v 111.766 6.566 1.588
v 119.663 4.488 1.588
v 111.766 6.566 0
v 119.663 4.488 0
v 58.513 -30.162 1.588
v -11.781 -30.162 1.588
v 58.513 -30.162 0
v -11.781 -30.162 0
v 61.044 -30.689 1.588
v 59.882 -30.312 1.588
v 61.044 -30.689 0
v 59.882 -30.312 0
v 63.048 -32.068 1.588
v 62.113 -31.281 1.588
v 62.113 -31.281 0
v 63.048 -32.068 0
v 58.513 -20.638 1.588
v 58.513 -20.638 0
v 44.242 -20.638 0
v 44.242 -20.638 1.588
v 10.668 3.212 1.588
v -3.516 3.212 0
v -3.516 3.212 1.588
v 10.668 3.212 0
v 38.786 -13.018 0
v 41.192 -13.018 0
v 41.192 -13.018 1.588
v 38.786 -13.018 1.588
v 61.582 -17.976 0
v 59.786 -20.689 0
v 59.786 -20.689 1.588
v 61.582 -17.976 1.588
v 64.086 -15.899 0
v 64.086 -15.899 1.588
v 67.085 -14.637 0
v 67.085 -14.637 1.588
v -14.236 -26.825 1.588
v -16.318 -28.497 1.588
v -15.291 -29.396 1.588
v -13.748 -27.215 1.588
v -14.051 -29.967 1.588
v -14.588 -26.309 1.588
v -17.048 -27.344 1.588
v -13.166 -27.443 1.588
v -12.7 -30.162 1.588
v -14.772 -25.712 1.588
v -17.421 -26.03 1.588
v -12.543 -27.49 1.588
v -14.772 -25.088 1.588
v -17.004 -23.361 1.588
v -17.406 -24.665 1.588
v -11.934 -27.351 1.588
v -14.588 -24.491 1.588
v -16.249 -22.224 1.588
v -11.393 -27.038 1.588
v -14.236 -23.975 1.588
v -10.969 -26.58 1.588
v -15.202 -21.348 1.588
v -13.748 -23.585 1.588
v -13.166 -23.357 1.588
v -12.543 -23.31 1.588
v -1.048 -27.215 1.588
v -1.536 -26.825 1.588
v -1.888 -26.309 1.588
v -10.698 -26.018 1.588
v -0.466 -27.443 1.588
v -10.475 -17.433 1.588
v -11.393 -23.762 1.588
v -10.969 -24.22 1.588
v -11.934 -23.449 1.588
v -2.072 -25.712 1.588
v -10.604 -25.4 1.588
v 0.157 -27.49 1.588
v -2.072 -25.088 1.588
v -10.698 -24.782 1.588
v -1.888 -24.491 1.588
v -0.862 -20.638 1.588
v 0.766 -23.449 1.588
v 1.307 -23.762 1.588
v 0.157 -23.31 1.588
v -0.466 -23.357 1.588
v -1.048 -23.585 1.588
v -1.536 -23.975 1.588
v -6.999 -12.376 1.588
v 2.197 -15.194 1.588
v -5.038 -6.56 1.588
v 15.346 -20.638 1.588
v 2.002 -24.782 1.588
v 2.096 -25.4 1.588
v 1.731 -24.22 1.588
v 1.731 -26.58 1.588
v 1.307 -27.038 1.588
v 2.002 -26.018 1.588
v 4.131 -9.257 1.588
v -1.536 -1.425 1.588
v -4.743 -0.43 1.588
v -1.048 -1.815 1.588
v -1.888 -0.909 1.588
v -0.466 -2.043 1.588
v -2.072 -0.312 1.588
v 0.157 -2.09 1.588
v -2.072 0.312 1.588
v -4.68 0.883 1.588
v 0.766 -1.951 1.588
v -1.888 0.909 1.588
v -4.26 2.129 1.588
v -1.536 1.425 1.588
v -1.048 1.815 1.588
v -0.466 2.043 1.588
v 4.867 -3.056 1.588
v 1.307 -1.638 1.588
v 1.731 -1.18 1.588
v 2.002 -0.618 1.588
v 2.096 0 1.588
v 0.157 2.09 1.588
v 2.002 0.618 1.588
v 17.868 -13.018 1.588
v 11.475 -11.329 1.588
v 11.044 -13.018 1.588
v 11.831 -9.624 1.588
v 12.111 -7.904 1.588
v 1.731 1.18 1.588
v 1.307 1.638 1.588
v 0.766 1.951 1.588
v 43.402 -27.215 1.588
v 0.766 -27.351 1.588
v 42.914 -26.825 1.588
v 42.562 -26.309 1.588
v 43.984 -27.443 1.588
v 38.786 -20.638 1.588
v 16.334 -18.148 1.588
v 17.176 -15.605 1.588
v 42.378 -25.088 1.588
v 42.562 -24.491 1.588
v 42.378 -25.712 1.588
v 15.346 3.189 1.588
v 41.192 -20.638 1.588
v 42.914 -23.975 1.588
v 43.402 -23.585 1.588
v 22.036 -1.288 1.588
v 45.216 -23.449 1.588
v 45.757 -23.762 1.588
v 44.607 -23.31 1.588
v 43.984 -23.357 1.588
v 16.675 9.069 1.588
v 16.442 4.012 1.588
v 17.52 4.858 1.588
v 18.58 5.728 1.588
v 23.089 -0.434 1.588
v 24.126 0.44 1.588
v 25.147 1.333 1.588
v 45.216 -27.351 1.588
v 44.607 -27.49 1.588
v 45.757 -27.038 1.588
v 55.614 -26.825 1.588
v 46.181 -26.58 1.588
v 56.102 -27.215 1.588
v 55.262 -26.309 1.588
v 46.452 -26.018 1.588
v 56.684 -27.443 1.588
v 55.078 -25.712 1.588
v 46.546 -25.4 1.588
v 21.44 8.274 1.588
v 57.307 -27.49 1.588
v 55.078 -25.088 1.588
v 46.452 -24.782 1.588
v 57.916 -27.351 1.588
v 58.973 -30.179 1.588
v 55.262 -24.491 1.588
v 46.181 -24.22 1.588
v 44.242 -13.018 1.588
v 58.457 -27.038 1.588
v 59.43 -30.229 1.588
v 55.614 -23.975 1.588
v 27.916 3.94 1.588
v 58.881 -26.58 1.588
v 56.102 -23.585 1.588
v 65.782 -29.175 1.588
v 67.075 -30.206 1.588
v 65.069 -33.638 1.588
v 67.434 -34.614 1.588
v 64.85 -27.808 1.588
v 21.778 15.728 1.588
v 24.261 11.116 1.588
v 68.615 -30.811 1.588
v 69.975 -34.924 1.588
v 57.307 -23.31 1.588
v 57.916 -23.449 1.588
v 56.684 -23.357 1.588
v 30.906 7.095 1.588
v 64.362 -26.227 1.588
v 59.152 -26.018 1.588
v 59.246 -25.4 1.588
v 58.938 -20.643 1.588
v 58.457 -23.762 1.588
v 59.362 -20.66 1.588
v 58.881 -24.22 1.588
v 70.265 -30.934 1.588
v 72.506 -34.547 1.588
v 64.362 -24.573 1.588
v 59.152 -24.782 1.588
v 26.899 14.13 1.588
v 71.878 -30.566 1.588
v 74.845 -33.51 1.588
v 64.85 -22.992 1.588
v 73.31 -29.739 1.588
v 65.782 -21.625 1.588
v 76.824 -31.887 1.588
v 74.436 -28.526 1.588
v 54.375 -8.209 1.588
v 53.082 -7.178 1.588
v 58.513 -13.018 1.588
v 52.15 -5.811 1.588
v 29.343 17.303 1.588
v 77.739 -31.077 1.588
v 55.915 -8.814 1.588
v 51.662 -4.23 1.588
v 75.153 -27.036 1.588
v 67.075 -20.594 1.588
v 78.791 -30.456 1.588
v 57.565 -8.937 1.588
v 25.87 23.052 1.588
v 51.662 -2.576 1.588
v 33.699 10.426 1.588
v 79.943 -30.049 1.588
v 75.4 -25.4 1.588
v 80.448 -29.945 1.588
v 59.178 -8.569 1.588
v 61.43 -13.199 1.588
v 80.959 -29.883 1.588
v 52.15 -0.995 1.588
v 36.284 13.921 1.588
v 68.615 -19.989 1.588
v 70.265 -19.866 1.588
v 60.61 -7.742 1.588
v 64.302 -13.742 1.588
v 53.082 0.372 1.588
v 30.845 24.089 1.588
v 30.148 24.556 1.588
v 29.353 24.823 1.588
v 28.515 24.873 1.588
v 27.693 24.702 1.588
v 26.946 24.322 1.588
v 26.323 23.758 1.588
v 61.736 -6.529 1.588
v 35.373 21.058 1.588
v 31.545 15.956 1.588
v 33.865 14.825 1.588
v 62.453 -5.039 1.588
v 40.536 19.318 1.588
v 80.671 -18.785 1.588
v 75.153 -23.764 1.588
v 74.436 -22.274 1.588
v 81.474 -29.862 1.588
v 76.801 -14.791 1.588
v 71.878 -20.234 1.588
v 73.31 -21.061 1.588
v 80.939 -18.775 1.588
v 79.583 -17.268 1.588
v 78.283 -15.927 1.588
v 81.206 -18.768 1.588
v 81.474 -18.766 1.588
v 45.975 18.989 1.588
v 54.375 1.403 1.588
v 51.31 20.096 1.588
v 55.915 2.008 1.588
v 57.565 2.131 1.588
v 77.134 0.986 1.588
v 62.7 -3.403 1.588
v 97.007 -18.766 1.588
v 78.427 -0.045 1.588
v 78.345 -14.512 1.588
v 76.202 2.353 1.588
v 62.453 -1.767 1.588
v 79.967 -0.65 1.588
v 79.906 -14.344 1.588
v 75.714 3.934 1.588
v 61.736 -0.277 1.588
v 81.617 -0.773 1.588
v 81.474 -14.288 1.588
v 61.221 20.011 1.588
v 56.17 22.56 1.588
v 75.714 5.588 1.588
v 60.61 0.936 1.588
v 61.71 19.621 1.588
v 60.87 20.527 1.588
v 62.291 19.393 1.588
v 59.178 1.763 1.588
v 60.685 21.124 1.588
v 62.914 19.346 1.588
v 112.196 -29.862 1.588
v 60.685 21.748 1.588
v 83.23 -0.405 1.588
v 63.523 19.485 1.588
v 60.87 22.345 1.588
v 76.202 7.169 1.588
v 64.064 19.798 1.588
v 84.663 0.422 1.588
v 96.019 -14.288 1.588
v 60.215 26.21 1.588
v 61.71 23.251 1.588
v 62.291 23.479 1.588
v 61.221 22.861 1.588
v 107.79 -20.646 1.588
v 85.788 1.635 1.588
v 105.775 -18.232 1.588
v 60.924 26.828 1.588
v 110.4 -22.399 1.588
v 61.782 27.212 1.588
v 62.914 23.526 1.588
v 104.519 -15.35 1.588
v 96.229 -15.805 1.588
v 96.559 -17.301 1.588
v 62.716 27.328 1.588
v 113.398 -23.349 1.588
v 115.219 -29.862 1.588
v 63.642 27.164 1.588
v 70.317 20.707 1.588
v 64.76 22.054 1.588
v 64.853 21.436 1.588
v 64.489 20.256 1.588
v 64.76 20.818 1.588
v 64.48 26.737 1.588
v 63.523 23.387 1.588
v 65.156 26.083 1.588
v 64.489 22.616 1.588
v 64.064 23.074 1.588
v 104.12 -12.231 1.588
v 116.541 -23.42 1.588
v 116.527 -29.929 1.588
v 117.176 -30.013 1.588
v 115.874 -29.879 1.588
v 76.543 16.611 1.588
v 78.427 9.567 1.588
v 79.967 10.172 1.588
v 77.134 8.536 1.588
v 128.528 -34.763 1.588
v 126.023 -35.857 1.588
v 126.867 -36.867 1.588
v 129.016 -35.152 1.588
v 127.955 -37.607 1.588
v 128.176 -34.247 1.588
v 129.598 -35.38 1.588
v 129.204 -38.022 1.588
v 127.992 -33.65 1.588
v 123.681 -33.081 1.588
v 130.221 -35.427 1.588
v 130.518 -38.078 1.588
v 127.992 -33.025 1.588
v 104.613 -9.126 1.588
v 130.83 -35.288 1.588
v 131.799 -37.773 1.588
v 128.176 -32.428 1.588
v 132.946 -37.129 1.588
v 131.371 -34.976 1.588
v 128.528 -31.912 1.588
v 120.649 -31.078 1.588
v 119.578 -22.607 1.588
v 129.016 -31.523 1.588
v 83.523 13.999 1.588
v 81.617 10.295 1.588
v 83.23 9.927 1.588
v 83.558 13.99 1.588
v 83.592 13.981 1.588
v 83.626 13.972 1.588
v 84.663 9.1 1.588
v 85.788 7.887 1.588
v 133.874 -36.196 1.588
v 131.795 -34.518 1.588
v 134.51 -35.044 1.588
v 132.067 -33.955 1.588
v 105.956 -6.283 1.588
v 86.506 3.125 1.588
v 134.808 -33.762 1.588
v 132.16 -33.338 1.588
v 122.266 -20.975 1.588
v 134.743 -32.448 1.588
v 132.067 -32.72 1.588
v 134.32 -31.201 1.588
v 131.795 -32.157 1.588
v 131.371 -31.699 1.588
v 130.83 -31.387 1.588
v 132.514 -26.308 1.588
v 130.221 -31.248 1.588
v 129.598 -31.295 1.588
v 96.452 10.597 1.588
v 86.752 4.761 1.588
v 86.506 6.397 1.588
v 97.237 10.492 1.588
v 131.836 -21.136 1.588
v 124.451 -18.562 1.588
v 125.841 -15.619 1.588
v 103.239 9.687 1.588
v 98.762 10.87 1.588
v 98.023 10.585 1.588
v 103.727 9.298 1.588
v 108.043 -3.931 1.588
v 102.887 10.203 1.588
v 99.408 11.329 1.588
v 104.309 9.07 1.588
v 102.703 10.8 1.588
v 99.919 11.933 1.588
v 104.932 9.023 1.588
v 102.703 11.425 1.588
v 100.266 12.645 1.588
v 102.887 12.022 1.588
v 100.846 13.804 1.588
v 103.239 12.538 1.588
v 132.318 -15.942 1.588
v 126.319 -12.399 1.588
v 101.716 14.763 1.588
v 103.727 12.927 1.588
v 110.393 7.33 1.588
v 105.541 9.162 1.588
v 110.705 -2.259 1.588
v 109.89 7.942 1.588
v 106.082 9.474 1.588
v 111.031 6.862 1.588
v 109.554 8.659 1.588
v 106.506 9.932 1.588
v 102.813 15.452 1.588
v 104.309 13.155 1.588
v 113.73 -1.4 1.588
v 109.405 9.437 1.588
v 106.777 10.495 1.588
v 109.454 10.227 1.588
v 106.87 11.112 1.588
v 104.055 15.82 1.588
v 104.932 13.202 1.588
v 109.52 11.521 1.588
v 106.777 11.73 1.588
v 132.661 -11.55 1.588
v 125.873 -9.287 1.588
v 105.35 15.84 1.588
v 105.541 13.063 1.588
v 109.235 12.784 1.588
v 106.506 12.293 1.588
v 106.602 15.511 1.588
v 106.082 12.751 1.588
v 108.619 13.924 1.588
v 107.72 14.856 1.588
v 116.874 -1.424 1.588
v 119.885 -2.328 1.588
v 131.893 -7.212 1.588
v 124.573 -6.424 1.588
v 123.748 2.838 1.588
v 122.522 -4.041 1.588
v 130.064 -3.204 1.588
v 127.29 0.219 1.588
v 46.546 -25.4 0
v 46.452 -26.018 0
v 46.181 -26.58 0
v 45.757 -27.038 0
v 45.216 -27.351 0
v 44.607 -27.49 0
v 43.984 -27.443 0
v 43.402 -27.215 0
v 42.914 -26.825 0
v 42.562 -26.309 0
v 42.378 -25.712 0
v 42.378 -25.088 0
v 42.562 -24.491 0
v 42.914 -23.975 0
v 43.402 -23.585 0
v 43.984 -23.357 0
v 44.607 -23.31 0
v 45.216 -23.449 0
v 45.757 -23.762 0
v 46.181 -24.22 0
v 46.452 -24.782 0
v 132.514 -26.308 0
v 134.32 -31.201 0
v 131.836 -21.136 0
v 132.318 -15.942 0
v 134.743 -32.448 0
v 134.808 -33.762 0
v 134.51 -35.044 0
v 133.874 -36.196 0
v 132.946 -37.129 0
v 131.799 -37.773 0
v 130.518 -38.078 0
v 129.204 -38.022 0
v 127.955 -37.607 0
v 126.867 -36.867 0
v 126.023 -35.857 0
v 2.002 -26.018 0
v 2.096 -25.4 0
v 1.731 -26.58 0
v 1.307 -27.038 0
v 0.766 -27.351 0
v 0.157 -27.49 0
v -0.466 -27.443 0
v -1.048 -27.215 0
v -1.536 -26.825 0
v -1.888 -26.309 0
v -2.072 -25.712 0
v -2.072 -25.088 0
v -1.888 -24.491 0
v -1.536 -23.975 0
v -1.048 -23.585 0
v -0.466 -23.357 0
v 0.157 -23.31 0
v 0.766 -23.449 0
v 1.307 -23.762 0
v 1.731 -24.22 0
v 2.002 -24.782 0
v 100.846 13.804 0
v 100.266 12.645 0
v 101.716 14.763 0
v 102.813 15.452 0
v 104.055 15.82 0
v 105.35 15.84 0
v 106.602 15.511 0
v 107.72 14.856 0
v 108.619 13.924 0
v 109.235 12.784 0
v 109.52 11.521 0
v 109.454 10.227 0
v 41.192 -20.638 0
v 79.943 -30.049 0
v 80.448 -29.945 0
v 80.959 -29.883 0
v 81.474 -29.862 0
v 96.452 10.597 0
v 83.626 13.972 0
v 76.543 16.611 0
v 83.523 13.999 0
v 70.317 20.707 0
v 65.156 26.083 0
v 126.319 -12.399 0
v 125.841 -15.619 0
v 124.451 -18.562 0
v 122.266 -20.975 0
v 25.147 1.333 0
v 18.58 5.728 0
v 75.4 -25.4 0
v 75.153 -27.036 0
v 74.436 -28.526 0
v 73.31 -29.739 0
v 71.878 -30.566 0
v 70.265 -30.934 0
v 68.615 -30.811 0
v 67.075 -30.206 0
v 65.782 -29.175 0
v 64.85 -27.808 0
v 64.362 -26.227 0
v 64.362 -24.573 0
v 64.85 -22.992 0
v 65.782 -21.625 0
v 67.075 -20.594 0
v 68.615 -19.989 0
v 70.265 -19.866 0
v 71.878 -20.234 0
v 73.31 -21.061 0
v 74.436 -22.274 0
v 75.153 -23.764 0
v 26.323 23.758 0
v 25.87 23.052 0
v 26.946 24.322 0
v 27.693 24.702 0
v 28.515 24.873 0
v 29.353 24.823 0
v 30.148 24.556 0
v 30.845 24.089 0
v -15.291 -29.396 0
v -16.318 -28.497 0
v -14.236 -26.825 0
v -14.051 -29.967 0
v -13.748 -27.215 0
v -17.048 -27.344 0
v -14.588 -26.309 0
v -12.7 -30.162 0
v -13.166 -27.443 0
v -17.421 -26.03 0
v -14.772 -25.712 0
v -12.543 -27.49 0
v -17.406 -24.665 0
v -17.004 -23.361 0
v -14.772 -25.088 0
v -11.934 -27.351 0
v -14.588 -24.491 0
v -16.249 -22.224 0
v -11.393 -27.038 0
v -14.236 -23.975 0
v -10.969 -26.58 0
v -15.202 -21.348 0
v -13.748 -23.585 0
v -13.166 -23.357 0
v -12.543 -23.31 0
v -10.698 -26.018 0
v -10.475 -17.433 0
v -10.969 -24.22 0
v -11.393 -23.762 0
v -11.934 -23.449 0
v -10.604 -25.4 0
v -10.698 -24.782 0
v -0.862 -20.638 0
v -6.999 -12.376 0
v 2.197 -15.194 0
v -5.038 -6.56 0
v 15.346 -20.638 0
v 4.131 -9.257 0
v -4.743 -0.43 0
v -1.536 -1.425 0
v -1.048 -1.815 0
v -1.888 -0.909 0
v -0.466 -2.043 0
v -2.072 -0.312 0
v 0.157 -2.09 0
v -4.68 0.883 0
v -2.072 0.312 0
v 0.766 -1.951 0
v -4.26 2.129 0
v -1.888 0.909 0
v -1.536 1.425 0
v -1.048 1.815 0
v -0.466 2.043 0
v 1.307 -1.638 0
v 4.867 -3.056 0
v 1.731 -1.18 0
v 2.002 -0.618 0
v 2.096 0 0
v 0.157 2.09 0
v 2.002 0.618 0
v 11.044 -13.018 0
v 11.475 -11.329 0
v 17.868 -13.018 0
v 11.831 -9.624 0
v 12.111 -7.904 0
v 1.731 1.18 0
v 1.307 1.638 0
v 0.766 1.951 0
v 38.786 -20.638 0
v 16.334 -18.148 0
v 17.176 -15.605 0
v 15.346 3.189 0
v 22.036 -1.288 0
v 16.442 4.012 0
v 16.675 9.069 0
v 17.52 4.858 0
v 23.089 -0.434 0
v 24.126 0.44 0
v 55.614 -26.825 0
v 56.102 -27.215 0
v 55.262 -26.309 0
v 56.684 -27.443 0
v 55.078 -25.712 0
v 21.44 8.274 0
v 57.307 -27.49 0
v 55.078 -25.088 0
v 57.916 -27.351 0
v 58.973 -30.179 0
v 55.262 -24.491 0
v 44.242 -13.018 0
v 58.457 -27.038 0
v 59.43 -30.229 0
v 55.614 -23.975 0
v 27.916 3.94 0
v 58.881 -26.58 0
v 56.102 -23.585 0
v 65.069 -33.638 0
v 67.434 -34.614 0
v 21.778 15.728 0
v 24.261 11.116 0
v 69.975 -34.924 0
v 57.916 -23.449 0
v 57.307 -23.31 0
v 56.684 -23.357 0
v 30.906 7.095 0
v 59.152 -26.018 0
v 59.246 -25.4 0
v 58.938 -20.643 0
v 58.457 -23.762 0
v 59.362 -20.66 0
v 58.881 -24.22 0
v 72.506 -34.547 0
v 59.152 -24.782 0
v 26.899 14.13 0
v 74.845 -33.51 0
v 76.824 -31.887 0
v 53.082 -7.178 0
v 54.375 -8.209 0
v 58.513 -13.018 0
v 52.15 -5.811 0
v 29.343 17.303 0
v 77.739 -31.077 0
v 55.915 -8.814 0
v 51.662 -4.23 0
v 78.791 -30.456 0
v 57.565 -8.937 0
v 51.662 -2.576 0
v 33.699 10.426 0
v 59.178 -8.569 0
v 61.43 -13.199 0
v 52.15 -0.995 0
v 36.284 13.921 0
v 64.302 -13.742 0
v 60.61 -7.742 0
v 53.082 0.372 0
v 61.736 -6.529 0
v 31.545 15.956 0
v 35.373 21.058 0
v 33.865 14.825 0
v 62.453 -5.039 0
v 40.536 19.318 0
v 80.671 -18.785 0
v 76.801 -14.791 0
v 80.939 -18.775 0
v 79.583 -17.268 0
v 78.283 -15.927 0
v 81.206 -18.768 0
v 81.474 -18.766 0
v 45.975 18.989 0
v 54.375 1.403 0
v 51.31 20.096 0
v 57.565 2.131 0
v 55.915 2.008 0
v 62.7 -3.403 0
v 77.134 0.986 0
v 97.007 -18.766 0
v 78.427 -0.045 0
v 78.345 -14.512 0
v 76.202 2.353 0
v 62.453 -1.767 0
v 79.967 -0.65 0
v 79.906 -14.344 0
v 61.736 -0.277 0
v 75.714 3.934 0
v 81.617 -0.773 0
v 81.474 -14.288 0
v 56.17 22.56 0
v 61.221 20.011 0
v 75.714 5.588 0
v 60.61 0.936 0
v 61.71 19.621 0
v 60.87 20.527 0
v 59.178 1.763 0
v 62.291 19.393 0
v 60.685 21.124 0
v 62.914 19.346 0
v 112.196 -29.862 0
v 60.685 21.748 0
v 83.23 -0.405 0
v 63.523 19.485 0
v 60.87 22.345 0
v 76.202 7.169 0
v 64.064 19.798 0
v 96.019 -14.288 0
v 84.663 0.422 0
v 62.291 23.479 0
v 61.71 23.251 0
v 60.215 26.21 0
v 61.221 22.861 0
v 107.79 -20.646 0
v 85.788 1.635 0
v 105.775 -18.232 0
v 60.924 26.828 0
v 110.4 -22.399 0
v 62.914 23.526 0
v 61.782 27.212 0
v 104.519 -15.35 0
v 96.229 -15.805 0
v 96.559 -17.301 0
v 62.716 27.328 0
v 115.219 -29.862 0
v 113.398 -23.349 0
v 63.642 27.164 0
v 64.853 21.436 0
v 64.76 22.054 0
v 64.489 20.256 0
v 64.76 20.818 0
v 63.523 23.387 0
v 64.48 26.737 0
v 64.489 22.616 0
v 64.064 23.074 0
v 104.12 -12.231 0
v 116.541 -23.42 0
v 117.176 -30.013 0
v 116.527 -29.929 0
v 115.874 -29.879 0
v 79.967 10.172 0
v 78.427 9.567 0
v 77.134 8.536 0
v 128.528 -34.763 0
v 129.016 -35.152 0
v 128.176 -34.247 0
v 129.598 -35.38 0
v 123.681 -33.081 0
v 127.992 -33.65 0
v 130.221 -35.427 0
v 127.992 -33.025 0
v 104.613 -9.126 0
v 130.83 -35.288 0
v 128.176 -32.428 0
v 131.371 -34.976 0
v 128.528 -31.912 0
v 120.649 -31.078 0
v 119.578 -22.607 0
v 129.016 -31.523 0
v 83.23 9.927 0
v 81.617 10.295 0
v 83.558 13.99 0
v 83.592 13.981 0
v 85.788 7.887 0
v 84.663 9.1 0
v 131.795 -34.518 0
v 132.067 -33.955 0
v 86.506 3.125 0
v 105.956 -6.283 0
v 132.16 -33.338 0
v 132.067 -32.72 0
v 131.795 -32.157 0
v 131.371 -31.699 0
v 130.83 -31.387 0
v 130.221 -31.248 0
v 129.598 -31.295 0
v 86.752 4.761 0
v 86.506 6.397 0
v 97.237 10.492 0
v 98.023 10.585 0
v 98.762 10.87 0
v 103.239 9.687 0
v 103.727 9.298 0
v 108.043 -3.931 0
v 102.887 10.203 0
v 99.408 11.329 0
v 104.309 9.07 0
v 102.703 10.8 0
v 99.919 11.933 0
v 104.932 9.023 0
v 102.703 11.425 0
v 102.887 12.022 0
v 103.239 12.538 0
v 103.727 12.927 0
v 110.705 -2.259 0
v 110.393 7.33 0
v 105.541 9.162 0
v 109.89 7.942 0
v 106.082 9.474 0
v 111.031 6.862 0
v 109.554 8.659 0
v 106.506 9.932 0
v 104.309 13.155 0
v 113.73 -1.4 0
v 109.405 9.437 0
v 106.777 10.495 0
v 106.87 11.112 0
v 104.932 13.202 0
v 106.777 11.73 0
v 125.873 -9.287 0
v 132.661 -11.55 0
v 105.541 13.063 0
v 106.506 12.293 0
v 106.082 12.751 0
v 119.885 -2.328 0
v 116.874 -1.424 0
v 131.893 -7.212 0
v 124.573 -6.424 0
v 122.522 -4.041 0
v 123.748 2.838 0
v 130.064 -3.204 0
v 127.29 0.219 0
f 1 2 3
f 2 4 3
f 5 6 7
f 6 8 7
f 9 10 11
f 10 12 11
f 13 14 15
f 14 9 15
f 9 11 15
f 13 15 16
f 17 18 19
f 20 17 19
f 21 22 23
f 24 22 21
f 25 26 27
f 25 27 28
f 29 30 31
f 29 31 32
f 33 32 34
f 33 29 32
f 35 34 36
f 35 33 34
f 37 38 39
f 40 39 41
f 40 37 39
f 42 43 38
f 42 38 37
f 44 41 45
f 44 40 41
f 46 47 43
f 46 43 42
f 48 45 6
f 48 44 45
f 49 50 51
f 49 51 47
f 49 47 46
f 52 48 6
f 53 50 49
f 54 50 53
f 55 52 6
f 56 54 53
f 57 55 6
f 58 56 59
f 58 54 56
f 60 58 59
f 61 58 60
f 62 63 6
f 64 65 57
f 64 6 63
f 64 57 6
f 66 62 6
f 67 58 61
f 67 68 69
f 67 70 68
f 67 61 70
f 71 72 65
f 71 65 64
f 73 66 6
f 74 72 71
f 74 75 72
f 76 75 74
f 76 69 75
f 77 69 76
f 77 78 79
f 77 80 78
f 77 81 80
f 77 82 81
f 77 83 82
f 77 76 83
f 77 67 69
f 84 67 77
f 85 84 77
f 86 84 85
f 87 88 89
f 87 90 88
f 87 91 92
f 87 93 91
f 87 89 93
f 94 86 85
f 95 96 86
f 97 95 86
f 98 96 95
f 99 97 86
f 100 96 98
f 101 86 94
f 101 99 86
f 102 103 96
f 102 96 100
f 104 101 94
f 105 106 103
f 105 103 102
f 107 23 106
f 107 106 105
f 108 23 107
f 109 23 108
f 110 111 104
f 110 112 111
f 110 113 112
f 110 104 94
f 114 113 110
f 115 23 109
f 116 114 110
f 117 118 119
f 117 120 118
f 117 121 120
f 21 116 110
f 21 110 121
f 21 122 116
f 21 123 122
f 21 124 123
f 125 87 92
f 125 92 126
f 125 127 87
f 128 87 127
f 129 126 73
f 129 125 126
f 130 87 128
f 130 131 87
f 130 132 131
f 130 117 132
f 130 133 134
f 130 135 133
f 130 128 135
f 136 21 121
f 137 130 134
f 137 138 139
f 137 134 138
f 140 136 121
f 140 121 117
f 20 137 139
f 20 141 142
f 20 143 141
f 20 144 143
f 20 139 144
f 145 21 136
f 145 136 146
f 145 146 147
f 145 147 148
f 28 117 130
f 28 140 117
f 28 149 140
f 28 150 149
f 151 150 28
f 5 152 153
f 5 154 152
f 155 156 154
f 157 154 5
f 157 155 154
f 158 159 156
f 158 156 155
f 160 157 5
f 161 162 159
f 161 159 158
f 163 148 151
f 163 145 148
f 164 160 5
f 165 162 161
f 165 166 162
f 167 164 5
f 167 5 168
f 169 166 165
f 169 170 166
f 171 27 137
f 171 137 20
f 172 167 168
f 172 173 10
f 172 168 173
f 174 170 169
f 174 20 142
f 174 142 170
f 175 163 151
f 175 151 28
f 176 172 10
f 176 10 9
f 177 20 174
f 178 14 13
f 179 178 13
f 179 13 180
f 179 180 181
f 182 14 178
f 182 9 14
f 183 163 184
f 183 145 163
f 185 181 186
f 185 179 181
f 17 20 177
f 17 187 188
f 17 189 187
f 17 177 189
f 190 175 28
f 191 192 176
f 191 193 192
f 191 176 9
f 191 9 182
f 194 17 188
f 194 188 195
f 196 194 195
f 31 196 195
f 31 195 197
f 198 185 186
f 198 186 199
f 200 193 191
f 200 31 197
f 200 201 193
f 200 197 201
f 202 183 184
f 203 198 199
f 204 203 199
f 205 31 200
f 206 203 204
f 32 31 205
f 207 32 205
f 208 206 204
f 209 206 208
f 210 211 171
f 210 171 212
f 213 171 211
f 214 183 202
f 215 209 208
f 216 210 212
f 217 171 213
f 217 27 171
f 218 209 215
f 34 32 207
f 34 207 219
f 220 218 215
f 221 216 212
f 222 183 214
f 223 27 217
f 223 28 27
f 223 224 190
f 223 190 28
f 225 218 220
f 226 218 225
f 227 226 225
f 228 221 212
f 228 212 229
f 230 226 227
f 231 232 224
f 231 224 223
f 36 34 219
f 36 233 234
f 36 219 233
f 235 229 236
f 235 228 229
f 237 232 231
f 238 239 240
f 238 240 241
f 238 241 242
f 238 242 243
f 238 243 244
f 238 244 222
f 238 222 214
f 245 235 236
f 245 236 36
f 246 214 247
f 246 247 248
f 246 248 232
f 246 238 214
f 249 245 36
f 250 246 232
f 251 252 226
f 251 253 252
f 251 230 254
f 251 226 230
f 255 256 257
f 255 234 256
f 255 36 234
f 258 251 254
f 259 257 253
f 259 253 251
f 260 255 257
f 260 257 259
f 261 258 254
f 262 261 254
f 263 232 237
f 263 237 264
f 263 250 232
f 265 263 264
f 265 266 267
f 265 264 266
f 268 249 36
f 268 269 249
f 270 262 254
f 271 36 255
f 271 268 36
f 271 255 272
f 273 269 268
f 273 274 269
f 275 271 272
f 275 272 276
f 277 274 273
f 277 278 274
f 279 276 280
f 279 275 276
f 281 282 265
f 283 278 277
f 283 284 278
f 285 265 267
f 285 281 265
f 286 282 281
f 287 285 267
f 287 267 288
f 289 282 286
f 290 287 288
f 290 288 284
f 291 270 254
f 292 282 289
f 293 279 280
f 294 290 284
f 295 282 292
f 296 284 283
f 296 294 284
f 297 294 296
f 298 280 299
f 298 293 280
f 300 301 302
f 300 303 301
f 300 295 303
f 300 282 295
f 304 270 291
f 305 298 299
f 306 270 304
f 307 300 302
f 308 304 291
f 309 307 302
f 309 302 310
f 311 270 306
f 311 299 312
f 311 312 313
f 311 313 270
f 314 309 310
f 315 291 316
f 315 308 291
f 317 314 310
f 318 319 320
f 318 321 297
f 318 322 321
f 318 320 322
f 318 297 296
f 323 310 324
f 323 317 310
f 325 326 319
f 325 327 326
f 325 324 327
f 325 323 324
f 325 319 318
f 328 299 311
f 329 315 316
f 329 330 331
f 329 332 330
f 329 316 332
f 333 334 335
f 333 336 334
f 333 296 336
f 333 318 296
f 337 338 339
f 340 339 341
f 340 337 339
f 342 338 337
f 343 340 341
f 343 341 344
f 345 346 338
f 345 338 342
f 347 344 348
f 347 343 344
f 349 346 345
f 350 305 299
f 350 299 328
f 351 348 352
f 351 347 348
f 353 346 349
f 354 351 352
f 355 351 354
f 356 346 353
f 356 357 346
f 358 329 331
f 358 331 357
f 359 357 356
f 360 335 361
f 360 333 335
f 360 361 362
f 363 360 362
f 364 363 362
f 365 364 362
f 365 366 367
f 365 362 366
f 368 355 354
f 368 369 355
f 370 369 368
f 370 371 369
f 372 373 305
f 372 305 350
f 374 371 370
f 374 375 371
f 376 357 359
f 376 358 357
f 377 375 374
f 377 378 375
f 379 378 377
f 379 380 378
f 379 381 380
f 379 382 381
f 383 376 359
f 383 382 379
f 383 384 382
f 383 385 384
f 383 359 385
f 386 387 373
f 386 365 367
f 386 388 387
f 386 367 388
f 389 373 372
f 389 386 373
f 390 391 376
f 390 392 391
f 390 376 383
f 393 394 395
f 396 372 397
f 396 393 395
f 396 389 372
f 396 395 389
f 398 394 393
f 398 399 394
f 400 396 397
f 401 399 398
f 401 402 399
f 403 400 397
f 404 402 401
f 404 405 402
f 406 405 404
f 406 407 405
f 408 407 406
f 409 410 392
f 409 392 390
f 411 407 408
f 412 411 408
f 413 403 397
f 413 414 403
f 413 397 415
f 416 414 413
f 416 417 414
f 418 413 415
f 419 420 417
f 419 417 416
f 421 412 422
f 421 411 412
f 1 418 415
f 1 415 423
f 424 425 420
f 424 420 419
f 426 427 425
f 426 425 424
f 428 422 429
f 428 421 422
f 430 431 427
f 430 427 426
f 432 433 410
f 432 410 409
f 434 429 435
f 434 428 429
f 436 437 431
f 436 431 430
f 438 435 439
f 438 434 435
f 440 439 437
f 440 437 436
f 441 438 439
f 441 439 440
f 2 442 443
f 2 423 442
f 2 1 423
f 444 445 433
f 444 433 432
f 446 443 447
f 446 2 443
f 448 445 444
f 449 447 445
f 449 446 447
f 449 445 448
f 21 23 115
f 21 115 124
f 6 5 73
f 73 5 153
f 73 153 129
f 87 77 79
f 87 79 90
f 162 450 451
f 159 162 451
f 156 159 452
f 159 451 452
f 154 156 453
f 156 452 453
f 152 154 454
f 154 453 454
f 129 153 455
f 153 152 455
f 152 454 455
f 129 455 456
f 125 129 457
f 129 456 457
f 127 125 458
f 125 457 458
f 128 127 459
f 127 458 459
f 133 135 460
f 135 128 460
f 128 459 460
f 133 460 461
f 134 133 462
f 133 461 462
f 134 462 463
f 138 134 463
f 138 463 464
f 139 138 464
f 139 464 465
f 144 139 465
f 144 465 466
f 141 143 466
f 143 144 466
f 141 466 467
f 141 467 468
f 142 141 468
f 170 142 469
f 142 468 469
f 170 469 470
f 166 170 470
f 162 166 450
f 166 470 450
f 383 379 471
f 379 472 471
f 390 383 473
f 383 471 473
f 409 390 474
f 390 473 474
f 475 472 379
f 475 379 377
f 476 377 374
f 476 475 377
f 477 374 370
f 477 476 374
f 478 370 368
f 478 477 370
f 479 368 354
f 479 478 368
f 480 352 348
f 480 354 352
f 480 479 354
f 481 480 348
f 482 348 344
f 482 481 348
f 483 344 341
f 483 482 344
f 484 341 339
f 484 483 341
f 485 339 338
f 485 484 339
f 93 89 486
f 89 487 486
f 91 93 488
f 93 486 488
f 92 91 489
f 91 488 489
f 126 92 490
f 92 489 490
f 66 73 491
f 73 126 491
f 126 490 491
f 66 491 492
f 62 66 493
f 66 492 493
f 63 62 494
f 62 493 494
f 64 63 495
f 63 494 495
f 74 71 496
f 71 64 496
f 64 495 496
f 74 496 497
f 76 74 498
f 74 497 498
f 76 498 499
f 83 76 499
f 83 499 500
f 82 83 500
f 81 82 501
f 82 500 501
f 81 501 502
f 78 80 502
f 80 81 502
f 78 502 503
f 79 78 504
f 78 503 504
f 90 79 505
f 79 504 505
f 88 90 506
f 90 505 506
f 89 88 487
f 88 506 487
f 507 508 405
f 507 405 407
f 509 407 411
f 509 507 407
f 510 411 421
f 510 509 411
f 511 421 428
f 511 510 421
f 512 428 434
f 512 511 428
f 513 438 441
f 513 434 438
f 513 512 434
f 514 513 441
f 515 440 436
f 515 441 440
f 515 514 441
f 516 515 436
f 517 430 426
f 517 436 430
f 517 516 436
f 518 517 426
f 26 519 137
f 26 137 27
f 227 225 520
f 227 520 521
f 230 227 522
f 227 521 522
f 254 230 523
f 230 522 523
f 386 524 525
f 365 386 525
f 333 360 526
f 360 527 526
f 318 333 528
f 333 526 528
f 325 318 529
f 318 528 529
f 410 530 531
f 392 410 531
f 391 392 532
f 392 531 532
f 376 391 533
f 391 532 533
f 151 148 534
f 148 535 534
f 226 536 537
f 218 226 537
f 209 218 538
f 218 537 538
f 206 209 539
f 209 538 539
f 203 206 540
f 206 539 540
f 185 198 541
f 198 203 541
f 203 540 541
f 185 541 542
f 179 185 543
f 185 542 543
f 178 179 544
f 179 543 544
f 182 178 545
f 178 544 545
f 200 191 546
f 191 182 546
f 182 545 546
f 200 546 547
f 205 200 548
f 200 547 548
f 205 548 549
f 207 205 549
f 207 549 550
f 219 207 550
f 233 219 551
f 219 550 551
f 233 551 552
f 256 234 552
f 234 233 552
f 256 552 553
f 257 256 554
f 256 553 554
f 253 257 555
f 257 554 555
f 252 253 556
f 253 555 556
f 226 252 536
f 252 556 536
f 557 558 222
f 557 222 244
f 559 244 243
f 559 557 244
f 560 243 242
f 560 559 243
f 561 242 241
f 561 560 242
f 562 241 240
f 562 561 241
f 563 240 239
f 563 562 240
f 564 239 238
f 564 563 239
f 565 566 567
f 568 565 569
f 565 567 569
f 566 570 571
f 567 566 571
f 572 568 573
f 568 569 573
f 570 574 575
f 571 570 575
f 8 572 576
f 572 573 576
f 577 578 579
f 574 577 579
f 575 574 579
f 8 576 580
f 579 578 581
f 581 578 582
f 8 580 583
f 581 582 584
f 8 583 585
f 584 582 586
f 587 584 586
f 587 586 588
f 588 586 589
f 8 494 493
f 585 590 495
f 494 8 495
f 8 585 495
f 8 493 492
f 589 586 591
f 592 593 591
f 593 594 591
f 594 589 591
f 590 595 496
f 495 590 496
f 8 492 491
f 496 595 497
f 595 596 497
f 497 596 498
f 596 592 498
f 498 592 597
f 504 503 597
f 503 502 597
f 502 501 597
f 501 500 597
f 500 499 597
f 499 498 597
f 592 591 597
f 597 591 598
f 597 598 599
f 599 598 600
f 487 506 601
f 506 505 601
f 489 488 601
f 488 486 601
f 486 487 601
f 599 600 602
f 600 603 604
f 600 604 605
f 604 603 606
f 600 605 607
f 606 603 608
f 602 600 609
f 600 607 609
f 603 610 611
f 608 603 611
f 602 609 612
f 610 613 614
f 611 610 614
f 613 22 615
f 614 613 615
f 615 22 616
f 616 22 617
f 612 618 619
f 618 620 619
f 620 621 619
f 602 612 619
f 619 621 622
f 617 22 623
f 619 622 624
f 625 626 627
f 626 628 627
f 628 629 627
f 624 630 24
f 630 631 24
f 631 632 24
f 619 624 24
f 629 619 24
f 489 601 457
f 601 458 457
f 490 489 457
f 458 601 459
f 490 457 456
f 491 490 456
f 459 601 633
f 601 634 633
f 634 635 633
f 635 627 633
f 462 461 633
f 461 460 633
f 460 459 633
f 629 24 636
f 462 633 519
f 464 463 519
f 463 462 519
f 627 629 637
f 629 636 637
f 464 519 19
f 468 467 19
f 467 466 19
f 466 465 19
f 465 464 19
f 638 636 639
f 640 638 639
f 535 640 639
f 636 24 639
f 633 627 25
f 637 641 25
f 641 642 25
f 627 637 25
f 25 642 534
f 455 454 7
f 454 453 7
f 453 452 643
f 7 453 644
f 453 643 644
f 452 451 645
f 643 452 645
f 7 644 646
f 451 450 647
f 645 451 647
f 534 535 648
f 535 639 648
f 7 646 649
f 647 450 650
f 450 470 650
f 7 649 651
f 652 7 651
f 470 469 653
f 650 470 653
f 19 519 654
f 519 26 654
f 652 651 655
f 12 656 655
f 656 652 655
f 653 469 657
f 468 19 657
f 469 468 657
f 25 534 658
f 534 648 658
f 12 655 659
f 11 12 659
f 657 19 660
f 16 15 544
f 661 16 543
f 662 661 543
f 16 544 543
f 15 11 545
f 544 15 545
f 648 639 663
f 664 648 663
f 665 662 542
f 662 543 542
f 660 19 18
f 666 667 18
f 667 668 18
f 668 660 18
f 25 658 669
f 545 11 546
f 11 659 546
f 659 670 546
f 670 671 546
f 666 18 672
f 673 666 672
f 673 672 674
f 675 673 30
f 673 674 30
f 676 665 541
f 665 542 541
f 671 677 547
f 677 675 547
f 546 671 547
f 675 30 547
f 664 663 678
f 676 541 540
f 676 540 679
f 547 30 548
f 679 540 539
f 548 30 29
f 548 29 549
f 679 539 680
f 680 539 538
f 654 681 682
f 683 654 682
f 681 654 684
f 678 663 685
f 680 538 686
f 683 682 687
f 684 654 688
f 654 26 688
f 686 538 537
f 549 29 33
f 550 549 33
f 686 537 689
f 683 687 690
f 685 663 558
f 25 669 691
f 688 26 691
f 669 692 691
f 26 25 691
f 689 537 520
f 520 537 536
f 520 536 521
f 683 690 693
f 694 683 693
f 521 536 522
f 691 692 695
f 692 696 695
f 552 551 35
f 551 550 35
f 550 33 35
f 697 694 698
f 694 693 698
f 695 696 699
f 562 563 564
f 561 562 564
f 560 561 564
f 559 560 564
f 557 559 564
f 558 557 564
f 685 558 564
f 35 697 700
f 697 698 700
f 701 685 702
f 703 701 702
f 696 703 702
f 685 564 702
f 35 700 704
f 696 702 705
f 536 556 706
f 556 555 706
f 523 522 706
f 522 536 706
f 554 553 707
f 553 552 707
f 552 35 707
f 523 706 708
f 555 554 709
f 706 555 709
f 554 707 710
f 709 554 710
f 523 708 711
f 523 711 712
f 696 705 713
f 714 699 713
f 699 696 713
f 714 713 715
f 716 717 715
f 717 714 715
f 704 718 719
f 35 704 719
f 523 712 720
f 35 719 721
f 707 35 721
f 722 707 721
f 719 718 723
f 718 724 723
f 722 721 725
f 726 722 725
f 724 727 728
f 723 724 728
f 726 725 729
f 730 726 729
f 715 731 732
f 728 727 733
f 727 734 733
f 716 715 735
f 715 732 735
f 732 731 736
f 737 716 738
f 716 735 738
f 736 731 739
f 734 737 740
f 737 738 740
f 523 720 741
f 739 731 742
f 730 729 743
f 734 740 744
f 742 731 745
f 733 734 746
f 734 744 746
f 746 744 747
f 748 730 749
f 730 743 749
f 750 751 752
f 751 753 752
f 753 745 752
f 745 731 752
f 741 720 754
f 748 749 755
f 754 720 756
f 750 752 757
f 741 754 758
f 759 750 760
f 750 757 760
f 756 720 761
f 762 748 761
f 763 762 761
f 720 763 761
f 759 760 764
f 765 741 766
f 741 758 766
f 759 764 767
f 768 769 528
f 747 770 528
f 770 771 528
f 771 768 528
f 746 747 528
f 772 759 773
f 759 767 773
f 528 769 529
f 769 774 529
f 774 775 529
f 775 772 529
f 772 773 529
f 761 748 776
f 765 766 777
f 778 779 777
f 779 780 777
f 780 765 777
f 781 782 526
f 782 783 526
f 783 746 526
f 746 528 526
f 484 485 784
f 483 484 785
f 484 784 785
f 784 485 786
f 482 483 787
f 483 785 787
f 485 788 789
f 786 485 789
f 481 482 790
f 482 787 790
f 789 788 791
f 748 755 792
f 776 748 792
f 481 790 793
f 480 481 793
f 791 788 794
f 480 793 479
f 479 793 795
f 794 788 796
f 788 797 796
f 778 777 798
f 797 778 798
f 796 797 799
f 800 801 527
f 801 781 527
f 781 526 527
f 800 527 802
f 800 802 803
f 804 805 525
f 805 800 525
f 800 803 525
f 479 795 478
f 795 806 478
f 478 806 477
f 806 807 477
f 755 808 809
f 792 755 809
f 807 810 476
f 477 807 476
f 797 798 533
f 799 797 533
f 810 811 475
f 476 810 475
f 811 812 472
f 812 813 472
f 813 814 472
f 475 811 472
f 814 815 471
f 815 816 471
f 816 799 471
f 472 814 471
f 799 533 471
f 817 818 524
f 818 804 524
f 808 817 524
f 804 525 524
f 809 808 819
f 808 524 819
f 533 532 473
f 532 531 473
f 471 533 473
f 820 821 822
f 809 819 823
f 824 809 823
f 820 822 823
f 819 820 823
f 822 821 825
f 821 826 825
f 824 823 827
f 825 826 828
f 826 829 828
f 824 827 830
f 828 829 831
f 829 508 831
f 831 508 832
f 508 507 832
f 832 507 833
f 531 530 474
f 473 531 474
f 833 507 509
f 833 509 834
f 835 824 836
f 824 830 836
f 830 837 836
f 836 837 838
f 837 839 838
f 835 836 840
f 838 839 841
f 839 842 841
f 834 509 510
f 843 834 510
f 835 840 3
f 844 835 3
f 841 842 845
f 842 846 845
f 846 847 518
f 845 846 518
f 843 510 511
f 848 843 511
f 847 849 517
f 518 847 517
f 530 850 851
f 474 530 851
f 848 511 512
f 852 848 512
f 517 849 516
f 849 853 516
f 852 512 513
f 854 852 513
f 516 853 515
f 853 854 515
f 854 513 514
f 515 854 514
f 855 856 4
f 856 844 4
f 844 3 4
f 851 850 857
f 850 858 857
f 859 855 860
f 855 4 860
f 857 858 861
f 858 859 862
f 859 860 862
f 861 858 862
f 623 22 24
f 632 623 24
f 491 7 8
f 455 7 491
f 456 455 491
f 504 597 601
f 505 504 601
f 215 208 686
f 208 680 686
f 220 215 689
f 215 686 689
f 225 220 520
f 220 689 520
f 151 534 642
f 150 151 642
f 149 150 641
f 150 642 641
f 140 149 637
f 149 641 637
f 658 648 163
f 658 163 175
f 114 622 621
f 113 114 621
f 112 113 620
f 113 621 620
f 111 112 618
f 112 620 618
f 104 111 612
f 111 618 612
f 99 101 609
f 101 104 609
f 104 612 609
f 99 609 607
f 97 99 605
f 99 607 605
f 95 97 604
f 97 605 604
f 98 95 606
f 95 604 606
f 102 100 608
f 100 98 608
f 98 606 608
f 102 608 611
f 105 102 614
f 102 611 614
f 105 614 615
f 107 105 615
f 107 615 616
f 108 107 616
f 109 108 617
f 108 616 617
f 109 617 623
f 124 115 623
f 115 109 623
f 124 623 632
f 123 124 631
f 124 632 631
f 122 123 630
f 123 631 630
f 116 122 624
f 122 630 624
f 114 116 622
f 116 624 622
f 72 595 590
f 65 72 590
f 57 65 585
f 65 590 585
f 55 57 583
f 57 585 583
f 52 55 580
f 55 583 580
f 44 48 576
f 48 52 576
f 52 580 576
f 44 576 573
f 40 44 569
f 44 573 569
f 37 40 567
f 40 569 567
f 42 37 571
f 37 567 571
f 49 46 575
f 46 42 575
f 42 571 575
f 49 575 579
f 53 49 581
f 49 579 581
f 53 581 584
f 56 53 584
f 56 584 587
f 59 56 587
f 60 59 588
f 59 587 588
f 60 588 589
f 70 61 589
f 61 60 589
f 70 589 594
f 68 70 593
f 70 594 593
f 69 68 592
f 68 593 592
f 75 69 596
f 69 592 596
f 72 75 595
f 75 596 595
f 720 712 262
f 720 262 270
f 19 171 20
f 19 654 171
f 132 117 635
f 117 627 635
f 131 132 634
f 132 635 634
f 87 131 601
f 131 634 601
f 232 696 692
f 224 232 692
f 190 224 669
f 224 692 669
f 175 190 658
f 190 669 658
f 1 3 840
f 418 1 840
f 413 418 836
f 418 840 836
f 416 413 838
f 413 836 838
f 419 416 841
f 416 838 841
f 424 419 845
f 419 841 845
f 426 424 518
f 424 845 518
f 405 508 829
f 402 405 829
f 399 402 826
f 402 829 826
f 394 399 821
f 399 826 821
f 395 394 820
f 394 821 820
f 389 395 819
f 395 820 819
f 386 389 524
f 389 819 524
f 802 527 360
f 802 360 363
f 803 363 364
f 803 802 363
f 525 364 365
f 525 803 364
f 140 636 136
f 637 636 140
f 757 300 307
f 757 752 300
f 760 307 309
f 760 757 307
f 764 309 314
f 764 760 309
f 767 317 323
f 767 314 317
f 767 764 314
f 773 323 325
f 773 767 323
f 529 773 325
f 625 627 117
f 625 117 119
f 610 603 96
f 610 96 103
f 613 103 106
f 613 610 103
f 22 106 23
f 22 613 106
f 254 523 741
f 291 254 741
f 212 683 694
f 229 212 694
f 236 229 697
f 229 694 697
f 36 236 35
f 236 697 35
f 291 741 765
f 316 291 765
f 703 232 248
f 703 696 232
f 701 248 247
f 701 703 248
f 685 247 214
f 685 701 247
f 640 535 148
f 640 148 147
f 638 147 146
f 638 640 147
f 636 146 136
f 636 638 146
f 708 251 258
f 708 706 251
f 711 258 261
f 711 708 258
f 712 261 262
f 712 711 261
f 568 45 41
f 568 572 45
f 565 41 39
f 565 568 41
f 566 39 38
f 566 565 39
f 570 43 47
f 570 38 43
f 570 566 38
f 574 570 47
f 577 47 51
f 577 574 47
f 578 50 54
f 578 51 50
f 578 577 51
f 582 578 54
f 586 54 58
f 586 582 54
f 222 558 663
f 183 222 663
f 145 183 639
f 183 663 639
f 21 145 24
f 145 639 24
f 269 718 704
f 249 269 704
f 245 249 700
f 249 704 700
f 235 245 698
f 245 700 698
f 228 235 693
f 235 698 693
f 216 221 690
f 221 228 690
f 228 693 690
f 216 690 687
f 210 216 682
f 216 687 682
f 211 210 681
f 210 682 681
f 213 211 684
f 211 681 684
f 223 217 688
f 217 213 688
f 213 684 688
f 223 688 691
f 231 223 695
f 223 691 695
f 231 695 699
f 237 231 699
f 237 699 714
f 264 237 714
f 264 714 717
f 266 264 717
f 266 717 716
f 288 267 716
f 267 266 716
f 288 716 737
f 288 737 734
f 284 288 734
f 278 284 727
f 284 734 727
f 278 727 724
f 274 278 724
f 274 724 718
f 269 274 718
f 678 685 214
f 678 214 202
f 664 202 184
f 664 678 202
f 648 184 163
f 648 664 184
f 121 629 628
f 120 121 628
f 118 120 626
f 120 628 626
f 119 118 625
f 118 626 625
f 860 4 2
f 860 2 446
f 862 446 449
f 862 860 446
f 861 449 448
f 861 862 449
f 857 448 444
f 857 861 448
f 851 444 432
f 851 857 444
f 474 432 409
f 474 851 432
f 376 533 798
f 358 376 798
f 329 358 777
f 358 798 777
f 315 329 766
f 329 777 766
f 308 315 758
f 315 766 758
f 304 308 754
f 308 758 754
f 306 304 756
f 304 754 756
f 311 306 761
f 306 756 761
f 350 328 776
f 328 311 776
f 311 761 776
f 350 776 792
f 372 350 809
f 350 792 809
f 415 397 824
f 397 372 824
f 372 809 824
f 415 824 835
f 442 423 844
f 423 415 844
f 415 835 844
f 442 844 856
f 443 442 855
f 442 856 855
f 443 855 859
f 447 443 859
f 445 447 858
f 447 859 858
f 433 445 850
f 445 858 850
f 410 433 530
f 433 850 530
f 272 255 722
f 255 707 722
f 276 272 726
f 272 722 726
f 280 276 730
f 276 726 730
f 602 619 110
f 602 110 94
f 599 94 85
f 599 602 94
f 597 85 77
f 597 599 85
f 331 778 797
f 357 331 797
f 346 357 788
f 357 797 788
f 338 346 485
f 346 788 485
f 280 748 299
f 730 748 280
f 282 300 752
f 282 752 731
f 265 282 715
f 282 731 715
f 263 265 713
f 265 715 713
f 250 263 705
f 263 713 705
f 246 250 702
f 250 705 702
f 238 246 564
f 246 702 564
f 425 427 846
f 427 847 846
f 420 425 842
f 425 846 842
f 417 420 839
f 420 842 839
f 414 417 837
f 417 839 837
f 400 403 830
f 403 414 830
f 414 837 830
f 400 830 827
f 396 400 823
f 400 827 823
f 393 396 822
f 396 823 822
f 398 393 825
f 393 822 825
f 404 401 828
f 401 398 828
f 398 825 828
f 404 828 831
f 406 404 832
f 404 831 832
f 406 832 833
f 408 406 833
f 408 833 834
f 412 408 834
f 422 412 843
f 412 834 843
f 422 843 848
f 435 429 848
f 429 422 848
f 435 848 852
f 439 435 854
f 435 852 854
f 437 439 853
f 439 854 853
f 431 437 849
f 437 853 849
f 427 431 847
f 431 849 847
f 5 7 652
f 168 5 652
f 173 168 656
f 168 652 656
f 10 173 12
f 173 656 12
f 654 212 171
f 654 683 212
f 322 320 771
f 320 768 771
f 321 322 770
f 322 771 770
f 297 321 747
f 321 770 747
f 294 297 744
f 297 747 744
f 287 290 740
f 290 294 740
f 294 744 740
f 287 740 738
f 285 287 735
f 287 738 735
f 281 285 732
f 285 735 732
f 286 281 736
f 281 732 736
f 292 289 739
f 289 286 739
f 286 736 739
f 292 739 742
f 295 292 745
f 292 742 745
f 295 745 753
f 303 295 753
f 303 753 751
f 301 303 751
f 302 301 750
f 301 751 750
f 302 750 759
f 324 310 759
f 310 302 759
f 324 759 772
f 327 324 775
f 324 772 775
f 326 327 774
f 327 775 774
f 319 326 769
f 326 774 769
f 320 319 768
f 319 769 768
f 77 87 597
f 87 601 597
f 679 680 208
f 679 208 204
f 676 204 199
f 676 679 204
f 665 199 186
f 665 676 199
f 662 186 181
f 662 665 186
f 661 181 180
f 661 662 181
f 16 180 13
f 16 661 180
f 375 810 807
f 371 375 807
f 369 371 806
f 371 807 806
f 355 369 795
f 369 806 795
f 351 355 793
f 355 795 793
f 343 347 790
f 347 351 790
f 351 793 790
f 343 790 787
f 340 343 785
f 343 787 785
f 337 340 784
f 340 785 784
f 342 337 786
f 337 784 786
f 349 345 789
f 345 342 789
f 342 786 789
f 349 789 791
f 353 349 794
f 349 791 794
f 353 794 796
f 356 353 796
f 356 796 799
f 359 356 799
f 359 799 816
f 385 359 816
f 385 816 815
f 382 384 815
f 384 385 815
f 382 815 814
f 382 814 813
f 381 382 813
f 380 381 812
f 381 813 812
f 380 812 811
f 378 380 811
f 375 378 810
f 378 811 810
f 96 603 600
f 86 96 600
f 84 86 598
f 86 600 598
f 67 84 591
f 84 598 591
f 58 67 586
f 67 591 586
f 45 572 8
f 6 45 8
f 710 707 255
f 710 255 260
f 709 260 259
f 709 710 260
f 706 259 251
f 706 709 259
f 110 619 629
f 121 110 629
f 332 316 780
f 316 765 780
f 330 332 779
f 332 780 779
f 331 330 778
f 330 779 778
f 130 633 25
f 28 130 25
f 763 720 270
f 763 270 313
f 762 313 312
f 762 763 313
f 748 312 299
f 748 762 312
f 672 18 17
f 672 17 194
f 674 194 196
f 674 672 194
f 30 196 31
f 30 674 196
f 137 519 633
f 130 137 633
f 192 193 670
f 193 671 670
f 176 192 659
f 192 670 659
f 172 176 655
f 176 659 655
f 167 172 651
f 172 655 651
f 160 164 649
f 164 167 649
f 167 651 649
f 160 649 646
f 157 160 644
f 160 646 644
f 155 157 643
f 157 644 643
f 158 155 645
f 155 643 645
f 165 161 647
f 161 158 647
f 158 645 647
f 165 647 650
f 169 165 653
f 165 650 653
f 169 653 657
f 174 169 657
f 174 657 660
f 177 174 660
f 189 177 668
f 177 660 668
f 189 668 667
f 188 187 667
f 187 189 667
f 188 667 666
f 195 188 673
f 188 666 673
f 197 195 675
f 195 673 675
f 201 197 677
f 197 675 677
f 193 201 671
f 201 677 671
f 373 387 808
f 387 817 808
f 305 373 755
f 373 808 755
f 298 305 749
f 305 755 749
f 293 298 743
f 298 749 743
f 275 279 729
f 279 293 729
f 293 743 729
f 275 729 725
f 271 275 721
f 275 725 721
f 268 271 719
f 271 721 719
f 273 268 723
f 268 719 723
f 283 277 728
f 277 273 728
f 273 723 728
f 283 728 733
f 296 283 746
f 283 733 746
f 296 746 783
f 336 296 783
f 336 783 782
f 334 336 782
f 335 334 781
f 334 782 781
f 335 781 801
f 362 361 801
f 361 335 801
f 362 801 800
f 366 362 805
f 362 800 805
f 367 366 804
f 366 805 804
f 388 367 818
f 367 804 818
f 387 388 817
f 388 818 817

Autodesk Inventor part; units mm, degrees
ref_plane "YZ Plane" through (0, 0, 0) normal (1, 0, 0) x (0, 1, 0)
ref_plane "XZ Plane" through (0, 0, 0) normal (0, 1, 0) x (-1, 0, 0)
ref_plane "XY Plane" through (0, 0, 0) normal (0, 0, 1) x (1, 0, 0)
sketch "main" plane through (0, 0, 0) normal (0, 0, 1) x (1, 0, 0)
  circle A0 centre (-14.2783, -9.7185) radius 2.1844
  ellipse E0 centre (34.925, 23.8125) end of major axis (34.925, 33.3375) minor radius 9.5235
  point P0 (-4.2471, 2.7063)
sketch "Sketch1" plane through (0, 0, 0) normal (0, 0, 1) x (1, 0, 0)
  arc A0 (-3.5163, 3.212) -> (-4.7431, -0.4299) centre (0, 0) ccw
  circle A1 centre (0, -25.4) radius 2.0955
  circle A2 centre (-12.7, -25.4) radius 2.0955
  arc A3 (-15.2019, -21.3476) -> (-12.7, -30.1625) centre (-12.7, -25.4) ccw
  line L0 (-12.7, -30.1625) -> (-11.7807, -30.1625)
  arc A4 (-15.2019, -21.3476) -> (-4.7431, -0.4299) centre (-26.8773, -2.4363) ccw
  line L1 (31.75, -25.4) -> (57.15, -25.4) construction
  line L2 (31.75, -25.4) -> (36.5125, -25.4) construction
  circle A5 centre (44.45, -25.4) radius 2.0955
  circle A6 centre (57.15, -25.4) radius 2.0955
  circle A7 centre (69.85, -25.4) radius 5.5499
  arc A8 (63.0478, -32.0675) -> (76.8244, -31.8872) centre (69.85, -25.4) ccw
  circle A9 centre (57.15, -3.403) radius 5.5499
  line L3 (-11.7807, -30.1625) -> (58.513, -30.1625)
  line L4 (81.474, -29.8619) -> (115.2189, -29.8619)
  line L5 (-11.7807, -30.1625) -> (61.6011, -30.1625) construction
  line L6 (78.2653, -29.8619) -> (115.2189, -29.8619) construction
  circle A10 centre (81.2023, 4.7609) radius 5.5499
  arc A11 (83.6265, 13.9723) -> (83.523, 13.9989) centre (81.2023, 4.7609) ccw
  arc A12 (65.1561, 26.0829) -> (83.523, 13.9989) centre (91.6512, 46.3534) ccw
  arc A13 (81.474, -29.8619) -> (76.8244, -31.8872) centre (81.474, -36.2119) ccw
  arc A14 (63.0478, -32.0675) -> (58.513, -30.1625) centre (58.513, -36.5125) ccw
  circle A15 centre (115.2189, -12.3994) radius 11.0998
  arc A16 (132.3184, -15.9417) -> (119.6634, 4.488) centre (115.2189, -12.3994) ccw
  circle A17 centre (104.775, 11.1125) radius 2.0955
  arc A18 (109.4545, 10.2271) -> (100.2659, 12.6454) centre (104.775, 11.1125) ccw
  line L7 (119.6634, 4.488) -> (111.766, 6.5664)
  line L8 (96.4518, 10.5969) -> (83.6265, 13.9723)
  arc A19 (96.4518, 10.5969) -> (100.2659, 12.6454) centre (97.2599, 13.6673) ccw
  arc A20 (109.4545, 10.2271) -> (111.766, 6.5664) centre (112.5741, 9.6369) ccw
  circle A21 centre (130.0641, -33.3375) radius 2.0955
  arc A22 (126.0228, -35.8574) -> (134.3205, -31.2011) centre (130.0641, -33.3375) ccw
  arc A23 (132.3184, -15.9417) -> (134.3205, -31.2011) centre (155.2553, -20.6933) ccw
  arc A24 (126.0228, -35.8574) -> (115.2189, -29.8619) centre (115.2189, -42.5941) ccw
  arc A25 (122.2659, -20.9753) -> (122.2726, -21.4129) centre (155.2553, -20.6933) ccw
  arc A26 (59.7857, -20.6886) -> (58.513, -20.6375) centre (58.513, -36.5125) ccw
  arc A27 (-0.8623, -20.6375) -> (4.8666, -3.0564) centre (-26.8773, -2.4363) ccw
  arc A28 (67.0849, -14.637) -> (58.513, -13.0175) centre (58.513, -36.5125) ccw
  arc A29 (11.0441, -13.0175) -> (12.1111, -7.9042) centre (-26.8773, -2.4363) ccw
  line L9 (4.8666, -3.0564) -> (12.1111, -7.9042)
  line L10 (18.5803, 5.7275) -> (25.1468, 1.3334)
  line L11 (21.4396, 8.2742) -> (27.9161, 3.9403)
  arc A30 (15.3458, -20.6375) -> (17.8676, -13.0175) centre (-26.8773, -2.4363) ccw
  line L12 (17.8676, -13.0175) -> (11.0441, -13.0175)
  line L13 (15.3458, -20.6375) -> (-0.8623, -20.6375)
  line L14 (38.7856, -20.6375) -> (38.7856, -13.0175)
  line L15 (41.1925, -20.6375) -> (41.1925, -13.0175)
  line L16 (44.2415, -13.0175) -> (44.2415, -20.6375)
  line L17 (58.513, -13.0175) -> (44.2415, -13.0175)
  line L18 (41.1925, -13.0175) -> (38.7856, -13.0175)
  line L19 (58.513, -20.6375) -> (44.2415, -20.6375)
  line L20 (41.1925, -20.6375) -> (38.7856, -20.6375)
  arc A31 (41.2533, 43.0681) -> (41.1925, 43.0108) centre (44.4887, 39.5733) ccw
  line L21 (15.3458, 3.189) -> (22.0356, -1.2876)
  arc A32 (15.3458, 3.189) -> (18.5803, 5.7275) centre (-22.4149, 54.6332) ccw
  arc A33 (21.4396, 8.2742) -> (29.3428, 17.3034) centre (-22.4149, 54.6332) ccw
  arc A34 (22.0356, -1.2876) -> (25.1468, 1.3334) centre (-22.4149, 54.6332) ccw
  arc A35 (40.5702, 20.9307) -> (41.1925, 20.8107) centre (44.4887, 39.5733) ccw
  arc A36 (27.9161, 3.9403) -> (36.2836, 13.9213) centre (-22.4149, 54.6332) ccw
  arc A37 (83.6265, 13.9723) -> (83.523, 13.9989) centre (81.2023, 4.7609) ccw
  arc A38 (112.1958, -29.8619) -> (117.1762, -30.0133) centre (115.2189, -12.3994) ccw
  arc A39 (67.0849, -14.637) -> (59.7857, -20.6886) centre (69.85, -25.4) ccw
  arc A40 (59.8098, -30.1625) -> (59.882, -30.3118) centre (69.85, -25.4) ccw
  arc A41 (79.9432, -30.0492) -> (80.0274, -29.8619) centre (69.85, -25.4) ccw
  arc A42 (81.474, -14.2875) -> (76.801, -14.7913) centre (81.474, -36.2119) ccw
  arc A43 (80.6713, -18.7848) -> (76.801, -14.7913) centre (69.85, -25.4) ccw
  arc A44 (81.474, -18.7664) -> (80.6713, -18.7848) centre (81.474, -36.2119) ccw
  line L22 (81.474, -18.7664) -> (97.0069, -18.7664)
  arc A45 (96.0187, -14.2875) -> (97.0069, -18.7664) centre (115.2189, -12.3994) ccw
  line L23 (96.0187, -14.2875) -> (81.474, -14.2875)
  circle A46 centre (62.7575, 21.436) radius 2.0955
  arc A47 (10.6679, 3.212) -> (25.8705, 23.0519) centre (-26.8733, 47.7228) ccw
  arc A48 (30.8454, 24.0889) -> (60.215, 26.2096) centre (44.4887, 39.5733) ccw
  arc A49 (29.3428, 17.3034) -> (36.2836, 13.9213) centre (44.4887, 39.5733) ccw
  arc A50 (30.8454, 24.0889) -> (25.8705, 23.0519) centre (28.7464, 21.7067) ccw
  arc A51 (65.1561, 26.0829) -> (60.215, 26.2096) centre (62.6345, 24.1537) ccw
  circle A52 centre (0, 0) radius 2.0955
  line L24 (-3.5163, 3.212) -> (10.6679, 3.212)
  point P0 (-1.8077, 4.4061)
  point P1 (107.9569, 7.5689)
  point P2 (100.2609, 9.5944)
  point P3 (9.126, 4.4208)
  point P4 (41.1925, 20.8107)
  dimension "d7" = 22.225
  dimension "d25" = 4.191
  dimension "d26" = 4.191
  dimension "d30" = 11.0998
  dimension "d31" = 11.0998
  dimension "d38" = 6.35
  dimension "d43" = 4.191
  dimension "d44" = 9.525
  dimension "d47" = 9.525
  dimension "d54" = 4.191
  dimension "d56" = 12.7
  dimension "d58" = 41.275
  dimension "d60" = 3.175
extrude "Extrusion1" add sketch "Sketch1" along normal blind 1.5875 contours L24 A47 A50 A48 A51 A12 A11 L8 A19 A18 A20 L7 A16 A23 A22 A24 L4 A13 A8 A14 L3 L0 A3 A4 A0
properties part number "reservoir_mount_inner" material "Acetal Resin, White"
